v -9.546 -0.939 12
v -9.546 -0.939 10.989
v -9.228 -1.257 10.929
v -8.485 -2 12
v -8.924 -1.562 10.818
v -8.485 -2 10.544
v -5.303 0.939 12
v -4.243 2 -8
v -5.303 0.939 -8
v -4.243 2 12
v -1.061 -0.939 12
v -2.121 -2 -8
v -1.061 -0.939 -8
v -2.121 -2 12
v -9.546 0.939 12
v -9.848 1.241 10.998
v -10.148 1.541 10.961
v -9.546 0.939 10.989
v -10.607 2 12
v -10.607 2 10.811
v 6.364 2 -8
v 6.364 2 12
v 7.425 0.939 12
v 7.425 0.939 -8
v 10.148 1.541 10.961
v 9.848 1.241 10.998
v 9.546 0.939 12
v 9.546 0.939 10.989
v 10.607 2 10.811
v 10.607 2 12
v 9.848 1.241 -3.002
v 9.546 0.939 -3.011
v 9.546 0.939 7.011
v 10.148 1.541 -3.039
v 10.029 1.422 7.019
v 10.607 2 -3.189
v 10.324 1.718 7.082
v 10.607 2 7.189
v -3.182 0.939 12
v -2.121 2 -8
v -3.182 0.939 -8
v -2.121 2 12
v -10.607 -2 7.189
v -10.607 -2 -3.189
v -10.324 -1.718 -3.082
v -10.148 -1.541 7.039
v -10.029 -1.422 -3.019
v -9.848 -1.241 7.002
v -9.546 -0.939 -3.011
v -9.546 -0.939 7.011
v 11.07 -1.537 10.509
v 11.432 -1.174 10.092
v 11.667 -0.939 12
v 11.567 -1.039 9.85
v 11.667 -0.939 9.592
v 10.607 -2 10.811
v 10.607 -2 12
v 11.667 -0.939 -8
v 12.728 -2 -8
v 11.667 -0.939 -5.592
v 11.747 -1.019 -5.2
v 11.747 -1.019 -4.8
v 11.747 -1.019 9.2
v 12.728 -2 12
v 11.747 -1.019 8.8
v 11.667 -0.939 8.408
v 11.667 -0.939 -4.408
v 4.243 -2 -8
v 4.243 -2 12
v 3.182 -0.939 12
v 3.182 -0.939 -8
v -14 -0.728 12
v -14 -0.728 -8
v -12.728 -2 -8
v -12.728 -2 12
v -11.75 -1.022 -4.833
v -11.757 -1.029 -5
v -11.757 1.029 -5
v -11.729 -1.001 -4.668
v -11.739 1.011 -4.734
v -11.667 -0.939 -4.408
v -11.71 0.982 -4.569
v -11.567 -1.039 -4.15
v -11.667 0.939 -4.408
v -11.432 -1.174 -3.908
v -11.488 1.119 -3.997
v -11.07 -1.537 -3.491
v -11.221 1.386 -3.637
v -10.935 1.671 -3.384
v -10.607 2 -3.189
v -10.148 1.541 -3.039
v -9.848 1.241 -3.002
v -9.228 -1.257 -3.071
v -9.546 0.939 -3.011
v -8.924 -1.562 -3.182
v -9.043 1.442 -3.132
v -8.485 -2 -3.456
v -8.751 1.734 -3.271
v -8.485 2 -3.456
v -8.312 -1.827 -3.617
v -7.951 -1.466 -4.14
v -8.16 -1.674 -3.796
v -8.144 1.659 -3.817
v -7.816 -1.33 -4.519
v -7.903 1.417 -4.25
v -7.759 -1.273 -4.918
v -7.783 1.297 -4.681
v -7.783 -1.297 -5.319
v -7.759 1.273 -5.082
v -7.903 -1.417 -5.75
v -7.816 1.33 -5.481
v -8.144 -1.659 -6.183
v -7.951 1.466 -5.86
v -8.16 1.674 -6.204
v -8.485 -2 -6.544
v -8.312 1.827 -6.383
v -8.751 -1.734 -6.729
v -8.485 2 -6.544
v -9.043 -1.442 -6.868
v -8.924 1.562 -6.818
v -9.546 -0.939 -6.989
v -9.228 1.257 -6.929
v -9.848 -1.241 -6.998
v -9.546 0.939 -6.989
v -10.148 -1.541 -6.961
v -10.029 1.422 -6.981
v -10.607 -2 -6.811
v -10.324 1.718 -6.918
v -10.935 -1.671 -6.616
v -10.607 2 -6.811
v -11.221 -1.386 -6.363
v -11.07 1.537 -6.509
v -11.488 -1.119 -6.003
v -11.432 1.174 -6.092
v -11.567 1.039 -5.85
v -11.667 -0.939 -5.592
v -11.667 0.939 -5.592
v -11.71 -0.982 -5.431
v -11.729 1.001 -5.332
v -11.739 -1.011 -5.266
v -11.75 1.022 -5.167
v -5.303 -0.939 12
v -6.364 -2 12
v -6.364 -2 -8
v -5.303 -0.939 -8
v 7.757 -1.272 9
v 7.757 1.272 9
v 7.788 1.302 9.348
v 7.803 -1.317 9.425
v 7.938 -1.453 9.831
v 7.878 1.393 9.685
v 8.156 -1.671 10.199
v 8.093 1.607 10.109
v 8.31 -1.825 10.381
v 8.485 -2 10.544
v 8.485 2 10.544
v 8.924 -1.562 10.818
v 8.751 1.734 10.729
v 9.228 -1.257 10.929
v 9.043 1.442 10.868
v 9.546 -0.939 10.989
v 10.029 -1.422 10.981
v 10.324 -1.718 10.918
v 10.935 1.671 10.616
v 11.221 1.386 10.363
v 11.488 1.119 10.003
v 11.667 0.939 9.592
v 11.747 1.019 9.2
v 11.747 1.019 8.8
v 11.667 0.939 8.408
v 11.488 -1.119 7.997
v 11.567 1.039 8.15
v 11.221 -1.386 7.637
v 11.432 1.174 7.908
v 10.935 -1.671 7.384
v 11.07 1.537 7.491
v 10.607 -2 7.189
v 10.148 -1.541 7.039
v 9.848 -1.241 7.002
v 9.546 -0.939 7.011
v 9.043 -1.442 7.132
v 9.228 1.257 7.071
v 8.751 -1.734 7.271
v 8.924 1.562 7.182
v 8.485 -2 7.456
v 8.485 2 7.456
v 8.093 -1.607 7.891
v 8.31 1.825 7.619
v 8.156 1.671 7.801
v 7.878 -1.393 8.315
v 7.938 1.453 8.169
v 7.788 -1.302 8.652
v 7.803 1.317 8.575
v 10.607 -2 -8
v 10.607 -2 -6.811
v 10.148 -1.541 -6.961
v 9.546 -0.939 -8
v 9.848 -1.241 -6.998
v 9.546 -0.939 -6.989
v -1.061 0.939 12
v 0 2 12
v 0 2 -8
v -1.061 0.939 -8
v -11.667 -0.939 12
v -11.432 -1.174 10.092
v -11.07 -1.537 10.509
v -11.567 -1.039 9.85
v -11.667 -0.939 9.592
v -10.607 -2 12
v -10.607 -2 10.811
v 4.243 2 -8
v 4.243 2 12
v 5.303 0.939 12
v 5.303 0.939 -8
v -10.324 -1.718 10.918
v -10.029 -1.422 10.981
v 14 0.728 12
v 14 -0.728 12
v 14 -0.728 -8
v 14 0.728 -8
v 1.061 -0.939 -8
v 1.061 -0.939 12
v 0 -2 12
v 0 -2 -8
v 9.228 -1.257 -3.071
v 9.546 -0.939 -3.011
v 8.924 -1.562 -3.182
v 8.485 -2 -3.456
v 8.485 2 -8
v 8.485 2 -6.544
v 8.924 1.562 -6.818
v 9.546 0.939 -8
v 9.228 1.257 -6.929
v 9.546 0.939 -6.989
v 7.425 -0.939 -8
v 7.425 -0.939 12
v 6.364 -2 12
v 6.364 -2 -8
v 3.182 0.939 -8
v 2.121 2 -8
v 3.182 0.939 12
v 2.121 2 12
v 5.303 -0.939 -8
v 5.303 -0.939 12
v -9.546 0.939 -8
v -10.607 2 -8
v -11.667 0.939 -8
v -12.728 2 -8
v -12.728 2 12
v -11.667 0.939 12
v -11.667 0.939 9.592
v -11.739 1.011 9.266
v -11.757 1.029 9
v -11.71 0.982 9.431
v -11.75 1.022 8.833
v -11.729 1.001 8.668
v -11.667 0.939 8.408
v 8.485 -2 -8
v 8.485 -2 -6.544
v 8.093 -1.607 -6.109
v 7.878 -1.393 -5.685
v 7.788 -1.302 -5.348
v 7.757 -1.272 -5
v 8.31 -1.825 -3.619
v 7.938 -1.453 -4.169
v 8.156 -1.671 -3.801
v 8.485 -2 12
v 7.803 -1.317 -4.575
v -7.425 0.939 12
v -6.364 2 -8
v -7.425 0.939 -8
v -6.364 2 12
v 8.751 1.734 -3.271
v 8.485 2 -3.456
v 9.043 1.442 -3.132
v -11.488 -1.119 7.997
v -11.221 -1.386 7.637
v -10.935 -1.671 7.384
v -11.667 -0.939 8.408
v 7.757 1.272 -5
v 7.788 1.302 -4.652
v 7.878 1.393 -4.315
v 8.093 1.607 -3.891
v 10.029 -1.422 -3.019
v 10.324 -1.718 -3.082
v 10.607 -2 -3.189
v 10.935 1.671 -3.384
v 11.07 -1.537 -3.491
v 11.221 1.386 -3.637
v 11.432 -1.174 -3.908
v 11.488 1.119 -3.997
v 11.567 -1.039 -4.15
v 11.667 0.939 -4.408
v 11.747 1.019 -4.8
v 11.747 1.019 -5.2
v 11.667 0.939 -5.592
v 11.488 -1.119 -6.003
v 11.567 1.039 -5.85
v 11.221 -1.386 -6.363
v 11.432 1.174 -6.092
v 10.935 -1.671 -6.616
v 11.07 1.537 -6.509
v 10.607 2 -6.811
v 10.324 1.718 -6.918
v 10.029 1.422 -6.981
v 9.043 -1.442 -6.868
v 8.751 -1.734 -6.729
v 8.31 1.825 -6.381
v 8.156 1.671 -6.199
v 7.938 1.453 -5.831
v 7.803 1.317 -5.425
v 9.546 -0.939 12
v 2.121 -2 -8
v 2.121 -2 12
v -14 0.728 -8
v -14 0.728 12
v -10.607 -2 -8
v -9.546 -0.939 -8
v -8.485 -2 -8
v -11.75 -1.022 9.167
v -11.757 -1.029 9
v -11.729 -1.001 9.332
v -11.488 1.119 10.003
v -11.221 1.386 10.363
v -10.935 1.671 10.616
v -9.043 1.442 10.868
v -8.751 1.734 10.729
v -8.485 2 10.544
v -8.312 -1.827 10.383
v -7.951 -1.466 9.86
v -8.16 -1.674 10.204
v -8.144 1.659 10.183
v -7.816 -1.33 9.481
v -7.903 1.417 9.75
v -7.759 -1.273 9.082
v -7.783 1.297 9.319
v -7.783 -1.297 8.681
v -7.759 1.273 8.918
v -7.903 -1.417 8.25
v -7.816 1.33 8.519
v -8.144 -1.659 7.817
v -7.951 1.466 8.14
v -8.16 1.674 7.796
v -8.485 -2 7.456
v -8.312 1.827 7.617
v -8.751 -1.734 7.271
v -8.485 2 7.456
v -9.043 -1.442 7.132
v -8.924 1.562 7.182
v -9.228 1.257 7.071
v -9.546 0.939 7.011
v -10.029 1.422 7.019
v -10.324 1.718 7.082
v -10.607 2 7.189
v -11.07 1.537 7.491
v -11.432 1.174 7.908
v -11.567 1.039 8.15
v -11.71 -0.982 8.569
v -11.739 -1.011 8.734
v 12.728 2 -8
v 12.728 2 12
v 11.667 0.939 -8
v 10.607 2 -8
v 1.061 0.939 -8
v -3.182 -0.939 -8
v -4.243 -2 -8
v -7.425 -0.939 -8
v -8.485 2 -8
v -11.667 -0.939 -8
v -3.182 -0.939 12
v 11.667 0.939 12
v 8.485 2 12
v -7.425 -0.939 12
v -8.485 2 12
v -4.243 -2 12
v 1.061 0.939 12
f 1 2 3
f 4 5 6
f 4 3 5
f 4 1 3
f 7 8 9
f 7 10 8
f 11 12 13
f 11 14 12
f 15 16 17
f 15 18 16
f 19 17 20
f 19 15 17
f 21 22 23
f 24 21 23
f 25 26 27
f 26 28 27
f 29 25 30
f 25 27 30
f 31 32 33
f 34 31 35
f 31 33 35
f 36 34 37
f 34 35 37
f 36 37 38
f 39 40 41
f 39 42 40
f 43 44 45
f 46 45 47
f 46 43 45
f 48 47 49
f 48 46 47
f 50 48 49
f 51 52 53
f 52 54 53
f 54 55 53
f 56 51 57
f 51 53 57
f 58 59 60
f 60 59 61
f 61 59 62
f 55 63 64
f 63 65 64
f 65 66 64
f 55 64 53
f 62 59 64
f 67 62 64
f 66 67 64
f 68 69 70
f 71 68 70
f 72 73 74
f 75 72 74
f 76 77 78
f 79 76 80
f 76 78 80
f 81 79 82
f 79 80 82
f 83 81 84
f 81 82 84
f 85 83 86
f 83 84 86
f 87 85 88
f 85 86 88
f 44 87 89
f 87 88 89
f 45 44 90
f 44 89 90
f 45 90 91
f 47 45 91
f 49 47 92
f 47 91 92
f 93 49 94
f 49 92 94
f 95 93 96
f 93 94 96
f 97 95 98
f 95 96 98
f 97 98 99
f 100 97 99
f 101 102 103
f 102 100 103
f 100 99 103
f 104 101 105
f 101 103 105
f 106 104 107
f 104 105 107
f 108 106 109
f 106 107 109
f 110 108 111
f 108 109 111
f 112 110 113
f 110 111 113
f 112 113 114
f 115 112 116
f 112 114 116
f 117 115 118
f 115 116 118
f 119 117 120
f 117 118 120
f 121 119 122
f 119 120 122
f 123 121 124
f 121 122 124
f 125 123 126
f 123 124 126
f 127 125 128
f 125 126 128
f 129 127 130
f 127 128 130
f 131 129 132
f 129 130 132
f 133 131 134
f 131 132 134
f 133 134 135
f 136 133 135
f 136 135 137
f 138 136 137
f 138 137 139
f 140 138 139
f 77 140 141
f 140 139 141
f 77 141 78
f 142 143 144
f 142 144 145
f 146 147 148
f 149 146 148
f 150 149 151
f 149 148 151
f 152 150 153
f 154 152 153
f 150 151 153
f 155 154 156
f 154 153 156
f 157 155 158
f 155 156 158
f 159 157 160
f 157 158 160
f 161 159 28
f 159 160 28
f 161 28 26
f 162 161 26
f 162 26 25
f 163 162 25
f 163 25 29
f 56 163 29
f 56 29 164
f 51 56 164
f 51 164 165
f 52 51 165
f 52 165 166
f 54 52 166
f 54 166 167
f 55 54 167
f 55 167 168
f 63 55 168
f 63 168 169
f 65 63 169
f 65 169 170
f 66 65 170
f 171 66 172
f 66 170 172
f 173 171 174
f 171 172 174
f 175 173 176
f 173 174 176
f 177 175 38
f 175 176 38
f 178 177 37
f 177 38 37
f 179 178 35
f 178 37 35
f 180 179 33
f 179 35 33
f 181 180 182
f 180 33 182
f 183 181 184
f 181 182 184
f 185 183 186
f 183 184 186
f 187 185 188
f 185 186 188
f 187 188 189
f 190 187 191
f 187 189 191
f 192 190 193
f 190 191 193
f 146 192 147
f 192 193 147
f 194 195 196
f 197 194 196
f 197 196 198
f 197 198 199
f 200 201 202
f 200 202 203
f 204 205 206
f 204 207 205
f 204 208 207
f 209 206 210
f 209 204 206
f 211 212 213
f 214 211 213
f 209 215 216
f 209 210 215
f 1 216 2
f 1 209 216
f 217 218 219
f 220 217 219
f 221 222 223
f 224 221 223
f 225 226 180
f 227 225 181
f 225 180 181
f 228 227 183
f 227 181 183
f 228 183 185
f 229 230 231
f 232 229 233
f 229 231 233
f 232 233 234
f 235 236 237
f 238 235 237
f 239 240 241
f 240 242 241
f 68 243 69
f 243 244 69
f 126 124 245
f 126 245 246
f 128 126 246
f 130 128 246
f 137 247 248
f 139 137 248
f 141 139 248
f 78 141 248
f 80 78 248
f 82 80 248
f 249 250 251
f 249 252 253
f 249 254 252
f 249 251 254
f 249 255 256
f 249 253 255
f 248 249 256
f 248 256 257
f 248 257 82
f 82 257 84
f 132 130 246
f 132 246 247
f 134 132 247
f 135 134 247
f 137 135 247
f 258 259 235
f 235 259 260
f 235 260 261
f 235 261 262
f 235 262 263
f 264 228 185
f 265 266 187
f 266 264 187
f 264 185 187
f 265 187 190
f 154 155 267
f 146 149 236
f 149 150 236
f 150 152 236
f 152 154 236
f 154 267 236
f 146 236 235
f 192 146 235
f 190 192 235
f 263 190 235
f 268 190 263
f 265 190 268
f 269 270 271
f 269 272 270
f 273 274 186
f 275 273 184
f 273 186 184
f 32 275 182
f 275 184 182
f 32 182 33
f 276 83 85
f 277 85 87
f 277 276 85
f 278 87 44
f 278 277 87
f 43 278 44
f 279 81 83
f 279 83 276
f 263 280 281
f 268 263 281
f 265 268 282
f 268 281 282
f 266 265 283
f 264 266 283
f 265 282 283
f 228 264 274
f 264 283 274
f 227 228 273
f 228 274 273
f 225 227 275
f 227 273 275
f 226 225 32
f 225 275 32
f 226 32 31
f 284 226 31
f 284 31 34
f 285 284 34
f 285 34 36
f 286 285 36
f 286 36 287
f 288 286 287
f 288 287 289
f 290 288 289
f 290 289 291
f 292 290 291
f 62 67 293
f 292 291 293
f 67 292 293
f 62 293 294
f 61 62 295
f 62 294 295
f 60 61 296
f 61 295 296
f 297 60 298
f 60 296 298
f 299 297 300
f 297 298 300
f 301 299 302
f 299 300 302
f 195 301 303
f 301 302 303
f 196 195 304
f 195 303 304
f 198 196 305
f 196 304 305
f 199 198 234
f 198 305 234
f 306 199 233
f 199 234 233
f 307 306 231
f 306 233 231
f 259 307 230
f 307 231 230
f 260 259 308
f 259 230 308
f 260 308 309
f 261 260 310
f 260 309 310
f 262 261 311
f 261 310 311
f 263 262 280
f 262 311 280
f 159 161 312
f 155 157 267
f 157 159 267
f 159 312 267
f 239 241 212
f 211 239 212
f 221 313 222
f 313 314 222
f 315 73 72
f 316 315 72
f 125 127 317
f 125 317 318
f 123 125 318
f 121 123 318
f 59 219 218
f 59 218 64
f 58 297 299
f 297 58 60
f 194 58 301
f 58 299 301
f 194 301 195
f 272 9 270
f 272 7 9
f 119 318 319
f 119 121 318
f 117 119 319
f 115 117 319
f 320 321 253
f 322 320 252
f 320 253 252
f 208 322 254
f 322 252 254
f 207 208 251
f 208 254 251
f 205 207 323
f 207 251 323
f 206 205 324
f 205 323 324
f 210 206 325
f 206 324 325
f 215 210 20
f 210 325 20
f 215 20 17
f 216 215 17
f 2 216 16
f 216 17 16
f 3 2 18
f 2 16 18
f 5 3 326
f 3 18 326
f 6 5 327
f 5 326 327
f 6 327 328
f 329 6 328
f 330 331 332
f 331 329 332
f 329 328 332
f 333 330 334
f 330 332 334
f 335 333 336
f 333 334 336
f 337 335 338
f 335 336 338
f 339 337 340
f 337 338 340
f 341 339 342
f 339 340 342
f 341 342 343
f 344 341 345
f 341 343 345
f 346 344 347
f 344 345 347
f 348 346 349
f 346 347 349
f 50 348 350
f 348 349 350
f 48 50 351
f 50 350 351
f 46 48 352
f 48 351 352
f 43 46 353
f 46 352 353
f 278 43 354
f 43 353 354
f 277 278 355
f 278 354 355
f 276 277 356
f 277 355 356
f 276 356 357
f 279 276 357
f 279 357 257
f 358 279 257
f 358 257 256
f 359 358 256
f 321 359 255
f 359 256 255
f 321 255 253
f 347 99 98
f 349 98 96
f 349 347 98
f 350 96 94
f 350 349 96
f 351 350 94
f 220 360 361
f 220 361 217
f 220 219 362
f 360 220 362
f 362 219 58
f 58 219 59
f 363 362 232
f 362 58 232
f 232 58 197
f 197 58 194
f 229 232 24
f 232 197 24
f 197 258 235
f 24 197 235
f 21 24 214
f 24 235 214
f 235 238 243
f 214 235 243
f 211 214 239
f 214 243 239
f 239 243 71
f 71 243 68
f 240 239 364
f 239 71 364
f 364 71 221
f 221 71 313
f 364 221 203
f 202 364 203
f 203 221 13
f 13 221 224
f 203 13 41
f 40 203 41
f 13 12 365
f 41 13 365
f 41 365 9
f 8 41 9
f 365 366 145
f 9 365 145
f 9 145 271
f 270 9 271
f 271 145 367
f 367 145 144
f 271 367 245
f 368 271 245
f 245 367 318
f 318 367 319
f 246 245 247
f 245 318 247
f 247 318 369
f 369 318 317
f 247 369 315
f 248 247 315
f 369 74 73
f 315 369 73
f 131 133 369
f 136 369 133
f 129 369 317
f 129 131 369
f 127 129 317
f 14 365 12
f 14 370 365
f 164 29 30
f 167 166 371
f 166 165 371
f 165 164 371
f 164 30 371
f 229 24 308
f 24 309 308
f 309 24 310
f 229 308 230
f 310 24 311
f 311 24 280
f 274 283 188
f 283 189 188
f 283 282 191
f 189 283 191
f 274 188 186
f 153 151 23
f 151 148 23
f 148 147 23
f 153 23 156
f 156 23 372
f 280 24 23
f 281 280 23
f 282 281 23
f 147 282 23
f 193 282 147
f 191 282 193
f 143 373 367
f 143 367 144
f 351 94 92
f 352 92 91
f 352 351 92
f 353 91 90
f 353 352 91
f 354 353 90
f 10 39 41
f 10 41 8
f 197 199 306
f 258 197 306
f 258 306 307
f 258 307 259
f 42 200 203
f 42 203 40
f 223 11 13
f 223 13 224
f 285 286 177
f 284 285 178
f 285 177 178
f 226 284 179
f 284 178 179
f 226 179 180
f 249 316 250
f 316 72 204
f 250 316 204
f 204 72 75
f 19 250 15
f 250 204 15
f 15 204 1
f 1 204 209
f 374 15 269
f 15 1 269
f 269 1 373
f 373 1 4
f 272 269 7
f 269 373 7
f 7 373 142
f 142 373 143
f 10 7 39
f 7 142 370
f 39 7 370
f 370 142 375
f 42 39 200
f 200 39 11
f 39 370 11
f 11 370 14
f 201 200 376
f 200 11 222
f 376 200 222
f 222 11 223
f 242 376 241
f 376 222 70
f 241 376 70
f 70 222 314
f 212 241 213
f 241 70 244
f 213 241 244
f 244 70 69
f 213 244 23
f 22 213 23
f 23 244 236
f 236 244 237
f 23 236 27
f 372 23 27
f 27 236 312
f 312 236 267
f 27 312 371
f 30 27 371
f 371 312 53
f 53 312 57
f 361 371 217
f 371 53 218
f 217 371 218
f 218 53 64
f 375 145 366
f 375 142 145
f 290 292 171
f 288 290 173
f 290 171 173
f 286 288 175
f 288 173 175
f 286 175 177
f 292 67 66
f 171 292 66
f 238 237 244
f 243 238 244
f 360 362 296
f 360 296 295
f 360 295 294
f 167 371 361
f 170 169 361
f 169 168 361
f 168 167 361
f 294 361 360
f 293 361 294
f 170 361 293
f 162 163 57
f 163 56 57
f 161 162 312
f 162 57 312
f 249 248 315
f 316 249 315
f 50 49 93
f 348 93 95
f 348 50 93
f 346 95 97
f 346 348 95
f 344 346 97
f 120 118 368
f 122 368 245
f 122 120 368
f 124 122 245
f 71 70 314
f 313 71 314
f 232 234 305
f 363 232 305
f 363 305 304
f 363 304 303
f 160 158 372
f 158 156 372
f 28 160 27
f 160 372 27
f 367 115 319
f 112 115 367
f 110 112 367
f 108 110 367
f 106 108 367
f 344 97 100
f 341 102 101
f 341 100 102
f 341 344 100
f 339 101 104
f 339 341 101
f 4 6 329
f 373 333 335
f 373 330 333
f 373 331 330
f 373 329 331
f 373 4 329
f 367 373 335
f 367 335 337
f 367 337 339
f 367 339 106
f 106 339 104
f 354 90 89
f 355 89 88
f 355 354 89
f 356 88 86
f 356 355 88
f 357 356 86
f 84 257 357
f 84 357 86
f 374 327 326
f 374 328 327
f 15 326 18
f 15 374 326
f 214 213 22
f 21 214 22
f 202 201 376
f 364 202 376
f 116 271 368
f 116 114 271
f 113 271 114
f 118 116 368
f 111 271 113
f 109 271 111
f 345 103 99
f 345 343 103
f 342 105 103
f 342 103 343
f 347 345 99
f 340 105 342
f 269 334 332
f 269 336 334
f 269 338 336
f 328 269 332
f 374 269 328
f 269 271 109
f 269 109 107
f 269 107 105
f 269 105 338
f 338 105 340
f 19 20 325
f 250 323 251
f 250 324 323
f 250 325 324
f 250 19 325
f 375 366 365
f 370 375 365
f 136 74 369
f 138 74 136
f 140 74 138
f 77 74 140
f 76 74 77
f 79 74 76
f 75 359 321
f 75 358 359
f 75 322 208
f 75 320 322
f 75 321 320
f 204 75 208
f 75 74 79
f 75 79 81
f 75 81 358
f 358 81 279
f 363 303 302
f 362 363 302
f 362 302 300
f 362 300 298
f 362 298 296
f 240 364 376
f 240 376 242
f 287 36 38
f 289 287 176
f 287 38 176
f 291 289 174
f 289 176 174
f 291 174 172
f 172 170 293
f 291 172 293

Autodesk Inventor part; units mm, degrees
ref_plane "YZ Plane" through (0, 0, 0) normal (1, 0, 0) x (0, 1, 0)
ref_plane "XZ Plane" through (0, 0, 0) normal (0, 1, 0) x (-1, 0, 0)
ref_plane "XY Plane" through (0, 0, 0) normal (0, 0, 1) x (1, 0, 0)
sketch "Sketch1" plane through (0, 0, 0) normal (0, 1, 0) x (-1, 0, 0)
  line L0 (14, 12) -> (-14, 12)
  line L1 (-14, 12) -> (-14, -8)
  line L2 (-14, -8) -> (14, -8)
  line L3 (14, -8) -> (14, 12)
  point P0 (0, 0)
  dimension "d0" = 28
  dimension "d1" = 20
  dimension "d4" = 14
extrude "Extrusion1" add sketch "Sketch1" along normal mid plane 4
sketch "Sketch2" plane through (-14, 2, 12) normal (0, 0, 1) x (1, 0, 0)
  line L0 (0, 0) -> (28, 0) projected
  line L1 (14, 0) -> (12.9393, -1.0607)
  line L2 (14, 0) -> (15.5, 0) construction
  line L3 (12.9393, -1.0607) -> (11.8787, 0)
  line L4 (11.8787, 0) -> (10.818, -1.0607)
  line L5 (10.818, -1.0607) -> (9.7574, 0)
  line L6 (9.7574, 0) -> (8.6967, -1.0607)
  line L7 (8.6967, -1.0607) -> (7.636, 0)
  line L8 (7.636, 0) -> (6.5754, -1.0607)
  line L9 (6.5754, -1.0607) -> (5.5147, 0)
  line L10 (5.5147, 0) -> (4.4541, -1.0607)
  line L11 (4.4541, -1.0607) -> (3.3934, 0)
  line L12 (3.3934, 0) -> (2.3327, -1.0607)
  line L13 (2.3327, -1.0607) -> (1.2721, 0)
  line L14 (1.2721, 0) -> (0, -1.2721)
  line L15 (0, -4) -> (0, 0) projected
  line L16 (14, 0) -> (15.0607, -1.0607)
  line L17 (15.0607, -1.0607) -> (16.1213, 0)
  line L18 (16.1213, 0) -> (17.182, -1.0607)
  line L19 (17.182, -1.0607) -> (18.2426, 0)
  line L20 (18.2426, 0) -> (19.3033, -1.0607)
  line L21 (19.3033, -1.0607) -> (20.364, 0)
  line L22 (20.364, 0) -> (21.4246, -1.0607)
  line L23 (21.4246, -1.0607) -> (22.4853, 0)
  line L24 (22.4853, 0) -> (23.5459, -1.0607)
  line L25 (23.5459, -1.0607) -> (24.6066, 0)
  line L26 (24.6066, 0) -> (25.6673, -1.0607)
  line L27 (25.6673, -1.0607) -> (26.7279, 0)
  line L28 (26.7279, 0) -> (28, -1.2721)
  line L29 (28, -4) -> (28, 0) projected
  point P0 (14, -2)
  point P1 (1.2721, 0)
  point P2 (1.2721, 0)
  point P3 (5.5147, 0)
  point P4 (5.5147, 0)
  point P5 (7.636, 0)
  point P6 (7.636, 0)
  point P7 (9.7574, 0)
  point P8 (9.7574, 0)
  dimension "d5" = 1.5
  dimension "d6" = 135
  dimension "d7" = 1.5
extrude "Extrusion2" cut sketch "Sketch2" against normal blind 50
mirror "Mirror1" about plane through (0, 0, 0) normal (0, 1, 0) of "Extrusion2"
sketch "Sketch4" plane through (0, 0, 0) normal (0, 1, 0) x (-1, 0, 0)
  circle A0 centre (9.757, -5) radius 2
  circle A1 centre (-9.757, -5) radius 2
  circle A2 centre (-9.757, 9) radius 2
  circle A3 centre (9.757, 9) radius 2
  point P0 (0, 0)
  dimension "d14" = 4
  dimension "d15" = 4
  dimension "d16" = 4
  dimension "d17" = 4
extrude "Extrusion4" cut sketch "Sketch4" against normal mid plane 6
properties part number "g2Tensioner"
